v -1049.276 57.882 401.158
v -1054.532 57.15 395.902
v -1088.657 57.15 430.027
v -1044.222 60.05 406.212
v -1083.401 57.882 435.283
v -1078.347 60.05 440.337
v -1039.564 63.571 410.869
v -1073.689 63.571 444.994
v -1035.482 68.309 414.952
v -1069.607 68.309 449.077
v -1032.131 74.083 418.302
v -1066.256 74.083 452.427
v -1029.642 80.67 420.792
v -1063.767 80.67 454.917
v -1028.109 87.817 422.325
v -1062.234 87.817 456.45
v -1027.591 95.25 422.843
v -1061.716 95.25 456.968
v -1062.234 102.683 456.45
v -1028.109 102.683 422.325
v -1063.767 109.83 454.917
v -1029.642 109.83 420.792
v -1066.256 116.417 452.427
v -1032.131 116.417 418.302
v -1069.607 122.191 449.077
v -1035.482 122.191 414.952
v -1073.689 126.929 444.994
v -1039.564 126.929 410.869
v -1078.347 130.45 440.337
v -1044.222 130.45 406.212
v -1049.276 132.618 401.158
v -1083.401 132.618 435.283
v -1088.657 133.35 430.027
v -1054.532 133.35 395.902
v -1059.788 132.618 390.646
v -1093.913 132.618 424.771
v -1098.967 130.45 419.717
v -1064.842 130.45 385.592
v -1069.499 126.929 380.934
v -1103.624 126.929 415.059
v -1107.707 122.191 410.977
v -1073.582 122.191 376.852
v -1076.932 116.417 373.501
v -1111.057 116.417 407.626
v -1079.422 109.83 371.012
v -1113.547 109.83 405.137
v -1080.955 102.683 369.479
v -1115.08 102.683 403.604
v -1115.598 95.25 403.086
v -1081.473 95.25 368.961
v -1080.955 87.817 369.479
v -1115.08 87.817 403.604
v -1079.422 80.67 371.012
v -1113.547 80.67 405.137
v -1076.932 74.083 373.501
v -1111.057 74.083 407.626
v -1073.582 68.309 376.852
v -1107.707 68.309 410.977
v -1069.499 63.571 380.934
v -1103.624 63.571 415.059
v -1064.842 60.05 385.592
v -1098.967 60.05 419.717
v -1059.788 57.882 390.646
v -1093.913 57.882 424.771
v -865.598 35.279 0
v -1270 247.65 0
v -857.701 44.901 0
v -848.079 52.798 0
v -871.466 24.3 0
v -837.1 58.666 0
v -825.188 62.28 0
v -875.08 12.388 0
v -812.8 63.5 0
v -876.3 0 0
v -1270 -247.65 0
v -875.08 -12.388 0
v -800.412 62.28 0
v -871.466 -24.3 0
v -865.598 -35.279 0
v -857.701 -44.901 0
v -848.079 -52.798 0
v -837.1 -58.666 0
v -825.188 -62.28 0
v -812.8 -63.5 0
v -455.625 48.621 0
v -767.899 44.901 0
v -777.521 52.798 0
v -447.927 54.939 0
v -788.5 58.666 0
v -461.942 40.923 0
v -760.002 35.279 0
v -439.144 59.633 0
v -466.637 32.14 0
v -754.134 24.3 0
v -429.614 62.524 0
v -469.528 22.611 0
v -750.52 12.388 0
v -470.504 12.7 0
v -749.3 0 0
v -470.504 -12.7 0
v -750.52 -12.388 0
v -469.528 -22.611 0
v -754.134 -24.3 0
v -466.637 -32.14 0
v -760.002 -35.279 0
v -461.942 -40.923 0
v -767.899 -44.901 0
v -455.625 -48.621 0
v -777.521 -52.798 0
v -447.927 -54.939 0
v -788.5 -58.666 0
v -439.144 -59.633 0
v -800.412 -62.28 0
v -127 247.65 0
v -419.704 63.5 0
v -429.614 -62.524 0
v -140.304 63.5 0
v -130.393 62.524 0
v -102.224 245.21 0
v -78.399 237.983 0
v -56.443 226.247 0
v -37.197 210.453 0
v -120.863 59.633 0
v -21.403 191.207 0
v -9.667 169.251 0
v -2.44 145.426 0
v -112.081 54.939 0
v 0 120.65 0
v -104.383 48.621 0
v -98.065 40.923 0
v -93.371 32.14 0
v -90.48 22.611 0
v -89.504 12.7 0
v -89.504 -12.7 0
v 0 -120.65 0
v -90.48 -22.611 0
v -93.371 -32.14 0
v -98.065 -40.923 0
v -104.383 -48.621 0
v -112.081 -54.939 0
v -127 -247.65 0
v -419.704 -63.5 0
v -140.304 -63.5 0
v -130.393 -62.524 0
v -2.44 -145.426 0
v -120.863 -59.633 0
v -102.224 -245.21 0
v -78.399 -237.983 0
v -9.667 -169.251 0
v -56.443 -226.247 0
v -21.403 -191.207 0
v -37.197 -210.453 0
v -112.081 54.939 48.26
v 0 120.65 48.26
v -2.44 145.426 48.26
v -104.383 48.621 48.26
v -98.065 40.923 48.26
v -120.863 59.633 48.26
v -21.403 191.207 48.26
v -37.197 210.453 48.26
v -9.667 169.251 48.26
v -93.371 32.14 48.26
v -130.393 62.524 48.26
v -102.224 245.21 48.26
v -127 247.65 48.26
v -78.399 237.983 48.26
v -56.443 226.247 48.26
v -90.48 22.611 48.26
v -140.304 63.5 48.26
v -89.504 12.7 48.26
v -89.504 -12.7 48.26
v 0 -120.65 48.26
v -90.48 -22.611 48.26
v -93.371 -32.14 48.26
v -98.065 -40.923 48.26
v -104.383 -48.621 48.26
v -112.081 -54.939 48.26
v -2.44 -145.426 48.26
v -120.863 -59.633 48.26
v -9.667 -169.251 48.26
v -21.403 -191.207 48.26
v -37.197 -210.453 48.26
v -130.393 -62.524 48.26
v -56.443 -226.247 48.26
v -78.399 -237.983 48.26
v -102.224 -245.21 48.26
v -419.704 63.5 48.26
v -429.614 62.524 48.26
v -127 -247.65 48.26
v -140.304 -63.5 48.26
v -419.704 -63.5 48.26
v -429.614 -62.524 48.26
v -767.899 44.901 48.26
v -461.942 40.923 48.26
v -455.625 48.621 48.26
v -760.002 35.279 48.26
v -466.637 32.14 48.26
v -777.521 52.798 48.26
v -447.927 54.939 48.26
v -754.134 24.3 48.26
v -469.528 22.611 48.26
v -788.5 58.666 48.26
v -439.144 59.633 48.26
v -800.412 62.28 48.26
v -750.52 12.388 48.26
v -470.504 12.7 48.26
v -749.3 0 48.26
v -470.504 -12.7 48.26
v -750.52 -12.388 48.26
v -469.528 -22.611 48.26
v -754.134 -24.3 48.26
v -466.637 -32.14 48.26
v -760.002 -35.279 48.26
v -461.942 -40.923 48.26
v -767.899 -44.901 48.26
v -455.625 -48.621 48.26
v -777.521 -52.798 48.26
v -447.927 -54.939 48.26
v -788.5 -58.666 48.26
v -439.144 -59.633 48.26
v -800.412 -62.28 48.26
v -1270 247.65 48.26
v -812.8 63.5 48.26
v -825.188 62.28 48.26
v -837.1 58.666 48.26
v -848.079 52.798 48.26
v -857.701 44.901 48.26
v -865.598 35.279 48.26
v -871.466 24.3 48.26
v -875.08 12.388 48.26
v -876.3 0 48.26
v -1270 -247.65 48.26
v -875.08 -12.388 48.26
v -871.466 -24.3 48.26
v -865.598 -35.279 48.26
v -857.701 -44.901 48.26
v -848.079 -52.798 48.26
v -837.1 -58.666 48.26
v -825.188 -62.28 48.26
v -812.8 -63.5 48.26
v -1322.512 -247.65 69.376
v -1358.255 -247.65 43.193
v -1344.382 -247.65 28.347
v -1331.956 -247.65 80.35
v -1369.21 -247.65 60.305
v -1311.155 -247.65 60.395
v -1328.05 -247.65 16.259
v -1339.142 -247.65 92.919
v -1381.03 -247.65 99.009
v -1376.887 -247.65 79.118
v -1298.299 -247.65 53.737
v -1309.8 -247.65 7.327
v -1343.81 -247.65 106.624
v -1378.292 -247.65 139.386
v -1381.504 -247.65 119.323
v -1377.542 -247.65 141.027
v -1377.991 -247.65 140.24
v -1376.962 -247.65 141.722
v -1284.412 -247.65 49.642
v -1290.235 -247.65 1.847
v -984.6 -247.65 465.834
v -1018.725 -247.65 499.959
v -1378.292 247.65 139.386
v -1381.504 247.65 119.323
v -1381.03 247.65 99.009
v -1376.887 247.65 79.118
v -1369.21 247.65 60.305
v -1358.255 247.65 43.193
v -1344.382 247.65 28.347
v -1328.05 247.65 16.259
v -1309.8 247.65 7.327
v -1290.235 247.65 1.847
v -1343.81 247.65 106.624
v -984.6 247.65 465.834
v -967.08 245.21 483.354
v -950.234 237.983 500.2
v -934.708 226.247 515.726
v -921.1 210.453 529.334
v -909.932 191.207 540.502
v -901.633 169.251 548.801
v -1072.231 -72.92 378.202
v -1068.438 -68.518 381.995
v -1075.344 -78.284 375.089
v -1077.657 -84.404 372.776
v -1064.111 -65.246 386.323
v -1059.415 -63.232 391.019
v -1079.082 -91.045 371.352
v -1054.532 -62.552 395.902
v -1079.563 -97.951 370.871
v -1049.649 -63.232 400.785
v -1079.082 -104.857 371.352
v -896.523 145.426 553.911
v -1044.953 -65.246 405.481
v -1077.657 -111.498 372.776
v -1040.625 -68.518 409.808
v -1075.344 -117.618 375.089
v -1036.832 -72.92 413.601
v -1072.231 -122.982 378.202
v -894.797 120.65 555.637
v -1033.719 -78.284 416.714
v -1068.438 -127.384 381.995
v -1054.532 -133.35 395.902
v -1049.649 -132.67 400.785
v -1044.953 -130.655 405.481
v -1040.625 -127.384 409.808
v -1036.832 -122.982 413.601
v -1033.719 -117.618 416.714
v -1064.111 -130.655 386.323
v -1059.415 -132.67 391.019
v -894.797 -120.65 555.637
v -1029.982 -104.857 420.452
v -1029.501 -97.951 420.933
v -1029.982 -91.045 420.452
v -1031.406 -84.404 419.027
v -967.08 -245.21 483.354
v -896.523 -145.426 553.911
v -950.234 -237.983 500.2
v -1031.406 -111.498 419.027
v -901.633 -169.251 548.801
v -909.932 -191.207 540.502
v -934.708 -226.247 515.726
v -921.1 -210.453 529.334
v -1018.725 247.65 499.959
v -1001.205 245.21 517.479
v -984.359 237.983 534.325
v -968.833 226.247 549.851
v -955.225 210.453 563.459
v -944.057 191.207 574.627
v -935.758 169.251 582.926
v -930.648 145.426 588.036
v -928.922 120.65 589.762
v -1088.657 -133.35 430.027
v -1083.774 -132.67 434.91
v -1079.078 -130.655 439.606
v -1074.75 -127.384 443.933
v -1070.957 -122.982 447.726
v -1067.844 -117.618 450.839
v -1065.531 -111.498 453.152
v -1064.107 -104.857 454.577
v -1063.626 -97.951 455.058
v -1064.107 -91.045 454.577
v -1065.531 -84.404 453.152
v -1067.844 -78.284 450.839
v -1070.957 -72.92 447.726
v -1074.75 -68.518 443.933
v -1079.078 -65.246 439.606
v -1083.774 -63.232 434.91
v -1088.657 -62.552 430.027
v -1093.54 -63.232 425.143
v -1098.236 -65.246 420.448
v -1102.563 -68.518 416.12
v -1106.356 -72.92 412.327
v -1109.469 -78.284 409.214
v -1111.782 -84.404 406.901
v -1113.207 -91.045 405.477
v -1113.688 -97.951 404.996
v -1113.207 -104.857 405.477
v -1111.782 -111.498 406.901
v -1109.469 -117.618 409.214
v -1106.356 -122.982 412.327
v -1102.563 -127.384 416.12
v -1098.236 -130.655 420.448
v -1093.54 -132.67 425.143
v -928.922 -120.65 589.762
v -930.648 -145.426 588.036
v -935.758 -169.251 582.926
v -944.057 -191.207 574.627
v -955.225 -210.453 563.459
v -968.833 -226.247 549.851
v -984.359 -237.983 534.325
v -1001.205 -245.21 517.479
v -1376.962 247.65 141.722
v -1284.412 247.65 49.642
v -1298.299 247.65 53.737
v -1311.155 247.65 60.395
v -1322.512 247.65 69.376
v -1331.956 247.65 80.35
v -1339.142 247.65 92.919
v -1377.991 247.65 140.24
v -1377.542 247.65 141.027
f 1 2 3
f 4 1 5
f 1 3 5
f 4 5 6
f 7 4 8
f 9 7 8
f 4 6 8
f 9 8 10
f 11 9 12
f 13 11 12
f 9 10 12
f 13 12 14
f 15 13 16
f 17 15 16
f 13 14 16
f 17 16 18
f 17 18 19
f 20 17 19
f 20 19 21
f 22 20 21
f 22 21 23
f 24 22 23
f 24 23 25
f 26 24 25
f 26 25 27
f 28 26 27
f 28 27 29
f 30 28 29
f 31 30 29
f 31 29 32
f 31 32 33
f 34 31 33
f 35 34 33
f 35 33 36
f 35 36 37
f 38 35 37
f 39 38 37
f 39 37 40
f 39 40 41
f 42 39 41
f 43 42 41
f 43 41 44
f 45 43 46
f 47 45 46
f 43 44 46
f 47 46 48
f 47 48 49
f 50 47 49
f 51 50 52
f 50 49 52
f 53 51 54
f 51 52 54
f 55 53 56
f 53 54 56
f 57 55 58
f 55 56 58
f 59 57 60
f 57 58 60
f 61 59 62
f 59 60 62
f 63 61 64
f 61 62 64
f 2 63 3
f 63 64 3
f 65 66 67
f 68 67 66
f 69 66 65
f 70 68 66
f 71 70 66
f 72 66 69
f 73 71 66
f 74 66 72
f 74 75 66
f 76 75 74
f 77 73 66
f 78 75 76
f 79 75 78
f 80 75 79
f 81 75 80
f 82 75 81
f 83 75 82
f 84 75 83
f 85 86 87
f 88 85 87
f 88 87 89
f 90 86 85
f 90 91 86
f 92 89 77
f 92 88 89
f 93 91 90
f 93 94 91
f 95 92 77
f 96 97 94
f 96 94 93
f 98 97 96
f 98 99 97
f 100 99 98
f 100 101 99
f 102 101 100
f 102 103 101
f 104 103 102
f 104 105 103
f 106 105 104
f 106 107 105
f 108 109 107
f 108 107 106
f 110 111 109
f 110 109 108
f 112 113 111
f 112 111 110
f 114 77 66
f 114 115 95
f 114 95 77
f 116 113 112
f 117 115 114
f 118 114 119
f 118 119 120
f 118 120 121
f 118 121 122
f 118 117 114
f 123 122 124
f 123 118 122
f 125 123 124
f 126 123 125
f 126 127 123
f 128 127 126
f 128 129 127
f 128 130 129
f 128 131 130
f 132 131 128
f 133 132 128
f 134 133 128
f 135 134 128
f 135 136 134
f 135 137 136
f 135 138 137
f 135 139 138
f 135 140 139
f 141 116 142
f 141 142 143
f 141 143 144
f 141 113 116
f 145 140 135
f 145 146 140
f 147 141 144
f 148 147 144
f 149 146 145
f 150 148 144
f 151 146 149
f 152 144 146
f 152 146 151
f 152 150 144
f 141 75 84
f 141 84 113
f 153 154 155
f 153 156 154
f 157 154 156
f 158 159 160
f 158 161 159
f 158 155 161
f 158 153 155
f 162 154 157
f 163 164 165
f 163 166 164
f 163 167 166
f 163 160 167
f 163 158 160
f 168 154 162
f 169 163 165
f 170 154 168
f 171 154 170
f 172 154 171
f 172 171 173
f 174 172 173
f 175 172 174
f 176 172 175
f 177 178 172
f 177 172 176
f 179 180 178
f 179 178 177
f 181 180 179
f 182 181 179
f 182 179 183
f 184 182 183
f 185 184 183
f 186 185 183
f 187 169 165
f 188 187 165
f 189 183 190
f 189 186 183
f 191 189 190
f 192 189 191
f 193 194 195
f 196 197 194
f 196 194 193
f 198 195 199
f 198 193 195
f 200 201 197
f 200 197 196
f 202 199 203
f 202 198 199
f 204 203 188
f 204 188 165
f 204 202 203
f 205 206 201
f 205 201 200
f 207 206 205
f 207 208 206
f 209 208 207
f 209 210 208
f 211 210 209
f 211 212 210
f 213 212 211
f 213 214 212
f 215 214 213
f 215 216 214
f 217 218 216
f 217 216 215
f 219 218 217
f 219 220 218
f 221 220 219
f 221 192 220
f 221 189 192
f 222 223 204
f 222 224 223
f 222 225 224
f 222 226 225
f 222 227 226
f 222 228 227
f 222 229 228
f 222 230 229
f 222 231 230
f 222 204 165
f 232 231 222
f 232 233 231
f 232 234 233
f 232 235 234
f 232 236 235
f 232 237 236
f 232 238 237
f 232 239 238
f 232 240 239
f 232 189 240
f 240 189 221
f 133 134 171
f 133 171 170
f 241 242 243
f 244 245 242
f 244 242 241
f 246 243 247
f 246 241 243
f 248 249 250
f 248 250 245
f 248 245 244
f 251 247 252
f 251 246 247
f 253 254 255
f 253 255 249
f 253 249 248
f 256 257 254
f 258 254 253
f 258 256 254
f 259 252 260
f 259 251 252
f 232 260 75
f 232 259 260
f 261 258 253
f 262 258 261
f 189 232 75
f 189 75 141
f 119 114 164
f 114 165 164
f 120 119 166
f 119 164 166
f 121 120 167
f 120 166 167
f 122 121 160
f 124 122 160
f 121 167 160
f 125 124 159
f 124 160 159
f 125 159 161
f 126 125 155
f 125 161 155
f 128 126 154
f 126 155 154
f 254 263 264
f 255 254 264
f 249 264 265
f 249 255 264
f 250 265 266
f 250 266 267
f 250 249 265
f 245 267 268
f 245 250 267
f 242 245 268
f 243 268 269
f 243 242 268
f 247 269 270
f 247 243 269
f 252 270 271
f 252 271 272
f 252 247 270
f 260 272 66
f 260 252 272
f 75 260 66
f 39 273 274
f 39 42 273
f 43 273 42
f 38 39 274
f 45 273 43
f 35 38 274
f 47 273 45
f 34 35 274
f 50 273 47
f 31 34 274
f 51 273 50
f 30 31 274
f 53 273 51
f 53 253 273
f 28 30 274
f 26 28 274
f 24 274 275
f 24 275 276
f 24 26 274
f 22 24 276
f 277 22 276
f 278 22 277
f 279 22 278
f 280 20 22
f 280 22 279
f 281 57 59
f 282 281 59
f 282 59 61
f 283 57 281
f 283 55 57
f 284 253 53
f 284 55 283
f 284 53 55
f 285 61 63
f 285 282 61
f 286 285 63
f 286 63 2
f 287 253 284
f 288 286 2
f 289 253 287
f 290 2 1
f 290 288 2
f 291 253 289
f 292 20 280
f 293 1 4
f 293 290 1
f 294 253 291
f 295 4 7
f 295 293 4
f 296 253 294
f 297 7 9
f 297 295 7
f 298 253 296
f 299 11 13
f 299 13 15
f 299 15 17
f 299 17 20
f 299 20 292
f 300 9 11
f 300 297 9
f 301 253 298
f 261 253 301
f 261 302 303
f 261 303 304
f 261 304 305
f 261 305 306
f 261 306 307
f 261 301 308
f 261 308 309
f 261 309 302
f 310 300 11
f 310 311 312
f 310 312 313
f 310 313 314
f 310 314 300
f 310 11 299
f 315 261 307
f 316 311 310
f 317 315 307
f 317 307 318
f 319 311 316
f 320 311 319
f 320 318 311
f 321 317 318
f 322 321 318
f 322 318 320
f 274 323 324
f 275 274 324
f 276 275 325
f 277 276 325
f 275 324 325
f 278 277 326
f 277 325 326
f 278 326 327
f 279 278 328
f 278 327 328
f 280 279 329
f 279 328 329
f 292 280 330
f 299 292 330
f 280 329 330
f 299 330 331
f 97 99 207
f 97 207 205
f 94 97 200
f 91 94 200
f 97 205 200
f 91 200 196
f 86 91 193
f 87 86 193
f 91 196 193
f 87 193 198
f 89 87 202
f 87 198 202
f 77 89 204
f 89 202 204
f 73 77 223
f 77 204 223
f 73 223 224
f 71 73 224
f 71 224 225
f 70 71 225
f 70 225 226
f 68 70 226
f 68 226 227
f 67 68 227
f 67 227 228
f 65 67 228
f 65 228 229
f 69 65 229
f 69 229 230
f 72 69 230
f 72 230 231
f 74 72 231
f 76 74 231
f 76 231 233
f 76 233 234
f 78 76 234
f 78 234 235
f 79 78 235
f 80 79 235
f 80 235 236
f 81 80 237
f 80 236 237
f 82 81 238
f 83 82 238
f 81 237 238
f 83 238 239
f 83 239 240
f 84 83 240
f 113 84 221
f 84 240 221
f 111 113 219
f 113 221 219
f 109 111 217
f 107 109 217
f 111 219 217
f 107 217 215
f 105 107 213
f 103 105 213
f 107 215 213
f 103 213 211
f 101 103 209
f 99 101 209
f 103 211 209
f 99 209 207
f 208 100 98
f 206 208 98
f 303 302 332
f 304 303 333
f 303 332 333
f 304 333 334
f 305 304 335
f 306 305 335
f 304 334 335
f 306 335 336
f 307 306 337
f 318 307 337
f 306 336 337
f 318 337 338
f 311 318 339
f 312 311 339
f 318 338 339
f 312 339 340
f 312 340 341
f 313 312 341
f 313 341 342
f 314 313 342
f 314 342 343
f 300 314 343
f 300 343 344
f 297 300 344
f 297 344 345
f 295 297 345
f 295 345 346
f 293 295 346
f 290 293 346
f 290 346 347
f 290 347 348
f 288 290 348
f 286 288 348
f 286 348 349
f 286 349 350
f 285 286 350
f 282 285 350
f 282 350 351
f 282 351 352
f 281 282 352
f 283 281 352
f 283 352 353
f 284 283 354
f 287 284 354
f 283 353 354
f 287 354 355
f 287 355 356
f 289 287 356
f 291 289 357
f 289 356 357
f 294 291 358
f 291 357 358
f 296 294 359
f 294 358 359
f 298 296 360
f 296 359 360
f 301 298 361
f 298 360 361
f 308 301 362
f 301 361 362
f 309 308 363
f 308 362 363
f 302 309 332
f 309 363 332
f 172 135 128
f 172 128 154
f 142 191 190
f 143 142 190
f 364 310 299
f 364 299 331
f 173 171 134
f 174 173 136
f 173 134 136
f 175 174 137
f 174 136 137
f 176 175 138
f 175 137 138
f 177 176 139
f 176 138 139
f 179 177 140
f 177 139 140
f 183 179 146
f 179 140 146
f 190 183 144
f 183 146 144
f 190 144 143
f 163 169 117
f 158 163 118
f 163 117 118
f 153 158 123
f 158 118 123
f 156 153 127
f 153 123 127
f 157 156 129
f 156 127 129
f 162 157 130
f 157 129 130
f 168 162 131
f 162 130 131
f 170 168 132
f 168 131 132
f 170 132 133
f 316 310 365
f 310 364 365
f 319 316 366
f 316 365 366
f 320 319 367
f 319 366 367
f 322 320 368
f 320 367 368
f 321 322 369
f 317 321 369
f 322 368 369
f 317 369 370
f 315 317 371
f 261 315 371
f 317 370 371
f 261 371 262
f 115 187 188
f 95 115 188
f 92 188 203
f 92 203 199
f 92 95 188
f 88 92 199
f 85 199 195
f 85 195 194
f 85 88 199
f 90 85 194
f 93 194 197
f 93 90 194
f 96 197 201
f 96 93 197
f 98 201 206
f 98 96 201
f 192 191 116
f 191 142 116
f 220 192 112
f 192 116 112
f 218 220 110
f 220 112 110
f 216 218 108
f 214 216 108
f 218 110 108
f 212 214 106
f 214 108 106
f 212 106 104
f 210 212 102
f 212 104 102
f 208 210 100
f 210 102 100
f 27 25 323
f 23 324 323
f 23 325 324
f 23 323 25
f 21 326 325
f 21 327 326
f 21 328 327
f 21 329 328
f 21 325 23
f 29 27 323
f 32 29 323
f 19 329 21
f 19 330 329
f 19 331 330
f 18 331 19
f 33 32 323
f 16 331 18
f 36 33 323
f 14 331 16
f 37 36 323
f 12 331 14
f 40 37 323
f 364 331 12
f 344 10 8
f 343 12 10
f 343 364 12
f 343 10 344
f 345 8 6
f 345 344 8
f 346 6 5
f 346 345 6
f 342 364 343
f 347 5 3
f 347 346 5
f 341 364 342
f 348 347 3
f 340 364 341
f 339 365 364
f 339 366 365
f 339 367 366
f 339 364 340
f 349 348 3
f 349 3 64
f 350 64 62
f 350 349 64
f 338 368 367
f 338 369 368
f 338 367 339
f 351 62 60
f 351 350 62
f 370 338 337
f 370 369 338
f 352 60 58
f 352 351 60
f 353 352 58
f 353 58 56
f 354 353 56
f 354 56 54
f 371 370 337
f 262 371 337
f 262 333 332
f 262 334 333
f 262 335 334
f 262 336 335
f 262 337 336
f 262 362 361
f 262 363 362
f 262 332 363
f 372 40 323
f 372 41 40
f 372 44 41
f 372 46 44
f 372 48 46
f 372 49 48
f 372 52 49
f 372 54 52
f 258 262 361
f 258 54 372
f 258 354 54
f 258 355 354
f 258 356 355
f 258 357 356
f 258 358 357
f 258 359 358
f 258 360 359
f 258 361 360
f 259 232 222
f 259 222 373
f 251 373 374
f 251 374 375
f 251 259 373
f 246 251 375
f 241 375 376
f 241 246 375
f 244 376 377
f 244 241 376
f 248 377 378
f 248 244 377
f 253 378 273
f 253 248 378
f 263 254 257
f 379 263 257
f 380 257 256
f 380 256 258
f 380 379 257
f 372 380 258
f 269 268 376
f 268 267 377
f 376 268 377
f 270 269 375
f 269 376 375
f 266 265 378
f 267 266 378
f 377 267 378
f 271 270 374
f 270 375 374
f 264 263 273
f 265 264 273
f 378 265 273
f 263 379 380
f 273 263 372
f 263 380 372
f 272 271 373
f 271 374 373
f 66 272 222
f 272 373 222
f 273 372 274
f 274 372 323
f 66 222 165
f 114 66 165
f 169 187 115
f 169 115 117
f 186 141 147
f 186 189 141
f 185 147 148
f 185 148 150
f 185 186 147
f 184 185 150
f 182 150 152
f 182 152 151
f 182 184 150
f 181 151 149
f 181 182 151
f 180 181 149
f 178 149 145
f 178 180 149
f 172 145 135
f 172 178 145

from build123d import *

# Parameters (mm, degrees)
F1_DEPTH  = 247.65
F2_R      = 5.08
F3_R      = 38.1
F3_R_2    = 35.399063
F4_DEPTH  = 127
F5_R      = 127
F6_R      = 127
F7_R      = 63.5
F8_DEPTH  = 127
F9_W      = 381
F9_H      = 127
F10_DEPTH = 127
F11_R     = 50.8


with BuildPart() as f1:
    # F0 (on Front) → F1 (new body, symmetric)
    with BuildSketch(Plane.XZ):
        with BuildLine():
            Line((-1270, 0), (0, 0))
            Line((0, 0), (0, 48.26))
            Line((0, 48.26), (-1270, 48.26))
            ThreePointArc((-1270, 48.26), (-1317.048486, 64.613863), (-1343.809963, 106.623768))
            Line((-1343.809963, 106.623768), (-894.797157, 555.636574))
            Line((-894.797157, 555.636574), (-928.92213, 589.761548))
            Line((-928.92213, 589.761548), (-1377.934936, 140.748742))
            ThreePointArc((-1377.934936, 140.748742), (-1358.685059, 43.750751), (-1270, 0))
        make_face()
    extrude(amount=F1_DEPTH, both=True)

    # F2
    f2_edges = [f1.edges().sort_by_distance(p)[0] for p in [
        (-1377.934936, 0, 140.748742),
    ]]
    fillet(f2_edges, radius=F2_R)

    # F3 (on face) → F4 (cut)
    with BuildSketch(Plane(origin=(-759.341839, 0, 759.341839), x_dir=(0, -1, 0), z_dir=(-0.707107, 0, 0.707107))):
        with Locations((-95.25, -465.721811)):
            Circle(F3_R)
        with Locations((97.950937, -465.721811)):
            Circle(F3_R_2)
    extrude(amount=-F4_DEPTH, mode=Mode.SUBTRACT)

    # F5
    f5_edges = [f1.edges().sort_by_distance(p)[0] for p in [
        (0, -247.65, 24.13),
        (0, 247.65, 24.13),
    ]]
    fillet(f5_edges, radius=F5_R)

    # F6
    f6_edges = [f1.edges().sort_by_distance(p)[0] for p in [
        (-911.859644, -247.65, 572.699061),
        (-911.859644, 247.65, 572.699061),
    ]]
    fillet(f6_edges, radius=F6_R)

    # F7 (on face) → F8 (cut)
    with BuildSketch(Plane.XY.offset(48.26)):
        with Locations((-812.8, 0)):
            Circle(F7_R)
    extrude(amount=-F8_DEPTH, mode=Mode.SUBTRACT)

    # F9 (on face) → F10 (cut)
    with BuildSketch(Plane.XY.offset(48.26)):
        with Locations((-280.003726, 0)):
            Rectangle(F9_W, F9_H)
    extrude(amount=-F10_DEPTH, mode=Mode.SUBTRACT)

    # F11
    f11_edges = [f1.edges().sort_by_distance(p)[0] for p in [
        (-470.503726, 63.5, 24.13),
        (-470.503726, -63.5, 24.13),
        (-89.503726, 63.5, 24.13),
        (-89.503726, -63.5, 24.13),
    ]]
    fillet(f11_edges, radius=F11_R)


solid = f1.part
